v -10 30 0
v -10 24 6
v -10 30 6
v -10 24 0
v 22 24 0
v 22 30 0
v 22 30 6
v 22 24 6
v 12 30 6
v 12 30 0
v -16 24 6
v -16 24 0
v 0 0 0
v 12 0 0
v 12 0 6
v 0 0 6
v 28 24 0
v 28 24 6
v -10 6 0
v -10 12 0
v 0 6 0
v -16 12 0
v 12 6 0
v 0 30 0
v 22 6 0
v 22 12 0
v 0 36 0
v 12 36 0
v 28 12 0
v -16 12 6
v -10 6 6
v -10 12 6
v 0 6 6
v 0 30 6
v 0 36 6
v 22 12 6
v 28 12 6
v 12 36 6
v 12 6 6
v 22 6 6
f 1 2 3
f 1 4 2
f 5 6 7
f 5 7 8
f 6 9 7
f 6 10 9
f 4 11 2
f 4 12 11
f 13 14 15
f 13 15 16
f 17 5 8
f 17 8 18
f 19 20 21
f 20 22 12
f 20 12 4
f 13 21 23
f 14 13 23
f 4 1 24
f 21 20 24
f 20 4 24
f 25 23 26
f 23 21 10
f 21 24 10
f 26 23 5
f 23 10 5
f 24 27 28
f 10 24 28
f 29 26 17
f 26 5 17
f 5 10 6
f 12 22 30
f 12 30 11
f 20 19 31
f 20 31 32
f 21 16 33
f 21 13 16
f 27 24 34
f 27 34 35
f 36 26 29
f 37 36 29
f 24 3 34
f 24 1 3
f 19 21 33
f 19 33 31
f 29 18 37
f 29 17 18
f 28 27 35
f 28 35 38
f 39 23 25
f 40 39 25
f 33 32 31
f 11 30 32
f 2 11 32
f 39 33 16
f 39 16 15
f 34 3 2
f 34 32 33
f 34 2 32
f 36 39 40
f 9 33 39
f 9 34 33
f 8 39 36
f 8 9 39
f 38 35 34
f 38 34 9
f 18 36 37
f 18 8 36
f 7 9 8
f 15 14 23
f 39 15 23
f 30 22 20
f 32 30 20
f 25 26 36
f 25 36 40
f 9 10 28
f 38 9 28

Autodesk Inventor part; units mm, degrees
ref_plane "YZ Plane" through (0, 0, 0) normal (1, 0, 0) x (0, 1, 0)
ref_plane "XZ Plane" through (0, 0, 0) normal (0, 1, 0) x (-1, 0, 0)
ref_plane "XY Plane" through (0, 0, 0) normal (0, 0, 1) x (1, 0, 0)
ref_plane "Work Plane1" through (0, 30, 0) normal (0, 0, 1) x (1, 0, 0)
sketch "Sketch1" plane through (0, 30, 0) normal (0, 0, 1) x (1, 0, 0)
  line L0 (0, 6) -> (12, 6) projected
  line L1 (0, 0) -> (0, 6) projected
  line L2 (12, 0) -> (0, 0) projected
  line L3 (12, 0) -> (12, 6) projected
  line L4 (28, -6) -> (28, -18) projected
  line L5 (22, -6) -> (28, -6) projected
  line L6 (22, -18) -> (22, -6) projected
  line L7 (22, -18) -> (28, -18) projected
  line L8 (0, -24) -> (12, -24) projected
  line L9 (0, -30) -> (0, -24) projected
  line L10 (12, -30) -> (0, -30) projected
  line L11 (12, -30) -> (12, -24) projected
  line L12 (-10, -6) -> (-10, -18) projected
  line L13 (-16, -6) -> (-10, -6) projected
  line L14 (-16, -18) -> (-16, -6) projected
  line L15 (-16, -18) -> (-10, -18) projected
  line L16 (-10, 0) -> (0, 0) projected
  line L17 (12, 0) -> (22, 0) projected
  line L18 (22, 6) -> (22, -6) projected
  line L19 (22, -18) -> (22, -30) projected
  line L20 (12, -24) -> (22, -24) projected
  line L21 (0, -24) -> (-10, -24) projected
  line L22 (-10, -30) -> (-10, -18) projected
  line L23 (-10, -6) -> (-10, 6) projected
extrude "Extrusion1" add sketch "Sketch1" along normal blind 6
equation "\"BendRadius\" = Thickness"
equation "\"BendReliefWidth\" = Thickness"
equation "\"BendReliefDepth\" = 0.5 * Thickness"
equation "\"CornerReliefSize\" = 4 * Thickness"
equation "\"MinimumRemnant\" = 2 * Thickness"
equation "\"TransitionRadius\" = BendRadius"
equation "\"JacobiRadiusSize\" = Thickness"
equation "\"GapSize\" = Thickness"
equation "\"Thickness\" = 0.5"
properties part number "onderkantBovenkant knoppendoosje" material "Wood (Birch)"
